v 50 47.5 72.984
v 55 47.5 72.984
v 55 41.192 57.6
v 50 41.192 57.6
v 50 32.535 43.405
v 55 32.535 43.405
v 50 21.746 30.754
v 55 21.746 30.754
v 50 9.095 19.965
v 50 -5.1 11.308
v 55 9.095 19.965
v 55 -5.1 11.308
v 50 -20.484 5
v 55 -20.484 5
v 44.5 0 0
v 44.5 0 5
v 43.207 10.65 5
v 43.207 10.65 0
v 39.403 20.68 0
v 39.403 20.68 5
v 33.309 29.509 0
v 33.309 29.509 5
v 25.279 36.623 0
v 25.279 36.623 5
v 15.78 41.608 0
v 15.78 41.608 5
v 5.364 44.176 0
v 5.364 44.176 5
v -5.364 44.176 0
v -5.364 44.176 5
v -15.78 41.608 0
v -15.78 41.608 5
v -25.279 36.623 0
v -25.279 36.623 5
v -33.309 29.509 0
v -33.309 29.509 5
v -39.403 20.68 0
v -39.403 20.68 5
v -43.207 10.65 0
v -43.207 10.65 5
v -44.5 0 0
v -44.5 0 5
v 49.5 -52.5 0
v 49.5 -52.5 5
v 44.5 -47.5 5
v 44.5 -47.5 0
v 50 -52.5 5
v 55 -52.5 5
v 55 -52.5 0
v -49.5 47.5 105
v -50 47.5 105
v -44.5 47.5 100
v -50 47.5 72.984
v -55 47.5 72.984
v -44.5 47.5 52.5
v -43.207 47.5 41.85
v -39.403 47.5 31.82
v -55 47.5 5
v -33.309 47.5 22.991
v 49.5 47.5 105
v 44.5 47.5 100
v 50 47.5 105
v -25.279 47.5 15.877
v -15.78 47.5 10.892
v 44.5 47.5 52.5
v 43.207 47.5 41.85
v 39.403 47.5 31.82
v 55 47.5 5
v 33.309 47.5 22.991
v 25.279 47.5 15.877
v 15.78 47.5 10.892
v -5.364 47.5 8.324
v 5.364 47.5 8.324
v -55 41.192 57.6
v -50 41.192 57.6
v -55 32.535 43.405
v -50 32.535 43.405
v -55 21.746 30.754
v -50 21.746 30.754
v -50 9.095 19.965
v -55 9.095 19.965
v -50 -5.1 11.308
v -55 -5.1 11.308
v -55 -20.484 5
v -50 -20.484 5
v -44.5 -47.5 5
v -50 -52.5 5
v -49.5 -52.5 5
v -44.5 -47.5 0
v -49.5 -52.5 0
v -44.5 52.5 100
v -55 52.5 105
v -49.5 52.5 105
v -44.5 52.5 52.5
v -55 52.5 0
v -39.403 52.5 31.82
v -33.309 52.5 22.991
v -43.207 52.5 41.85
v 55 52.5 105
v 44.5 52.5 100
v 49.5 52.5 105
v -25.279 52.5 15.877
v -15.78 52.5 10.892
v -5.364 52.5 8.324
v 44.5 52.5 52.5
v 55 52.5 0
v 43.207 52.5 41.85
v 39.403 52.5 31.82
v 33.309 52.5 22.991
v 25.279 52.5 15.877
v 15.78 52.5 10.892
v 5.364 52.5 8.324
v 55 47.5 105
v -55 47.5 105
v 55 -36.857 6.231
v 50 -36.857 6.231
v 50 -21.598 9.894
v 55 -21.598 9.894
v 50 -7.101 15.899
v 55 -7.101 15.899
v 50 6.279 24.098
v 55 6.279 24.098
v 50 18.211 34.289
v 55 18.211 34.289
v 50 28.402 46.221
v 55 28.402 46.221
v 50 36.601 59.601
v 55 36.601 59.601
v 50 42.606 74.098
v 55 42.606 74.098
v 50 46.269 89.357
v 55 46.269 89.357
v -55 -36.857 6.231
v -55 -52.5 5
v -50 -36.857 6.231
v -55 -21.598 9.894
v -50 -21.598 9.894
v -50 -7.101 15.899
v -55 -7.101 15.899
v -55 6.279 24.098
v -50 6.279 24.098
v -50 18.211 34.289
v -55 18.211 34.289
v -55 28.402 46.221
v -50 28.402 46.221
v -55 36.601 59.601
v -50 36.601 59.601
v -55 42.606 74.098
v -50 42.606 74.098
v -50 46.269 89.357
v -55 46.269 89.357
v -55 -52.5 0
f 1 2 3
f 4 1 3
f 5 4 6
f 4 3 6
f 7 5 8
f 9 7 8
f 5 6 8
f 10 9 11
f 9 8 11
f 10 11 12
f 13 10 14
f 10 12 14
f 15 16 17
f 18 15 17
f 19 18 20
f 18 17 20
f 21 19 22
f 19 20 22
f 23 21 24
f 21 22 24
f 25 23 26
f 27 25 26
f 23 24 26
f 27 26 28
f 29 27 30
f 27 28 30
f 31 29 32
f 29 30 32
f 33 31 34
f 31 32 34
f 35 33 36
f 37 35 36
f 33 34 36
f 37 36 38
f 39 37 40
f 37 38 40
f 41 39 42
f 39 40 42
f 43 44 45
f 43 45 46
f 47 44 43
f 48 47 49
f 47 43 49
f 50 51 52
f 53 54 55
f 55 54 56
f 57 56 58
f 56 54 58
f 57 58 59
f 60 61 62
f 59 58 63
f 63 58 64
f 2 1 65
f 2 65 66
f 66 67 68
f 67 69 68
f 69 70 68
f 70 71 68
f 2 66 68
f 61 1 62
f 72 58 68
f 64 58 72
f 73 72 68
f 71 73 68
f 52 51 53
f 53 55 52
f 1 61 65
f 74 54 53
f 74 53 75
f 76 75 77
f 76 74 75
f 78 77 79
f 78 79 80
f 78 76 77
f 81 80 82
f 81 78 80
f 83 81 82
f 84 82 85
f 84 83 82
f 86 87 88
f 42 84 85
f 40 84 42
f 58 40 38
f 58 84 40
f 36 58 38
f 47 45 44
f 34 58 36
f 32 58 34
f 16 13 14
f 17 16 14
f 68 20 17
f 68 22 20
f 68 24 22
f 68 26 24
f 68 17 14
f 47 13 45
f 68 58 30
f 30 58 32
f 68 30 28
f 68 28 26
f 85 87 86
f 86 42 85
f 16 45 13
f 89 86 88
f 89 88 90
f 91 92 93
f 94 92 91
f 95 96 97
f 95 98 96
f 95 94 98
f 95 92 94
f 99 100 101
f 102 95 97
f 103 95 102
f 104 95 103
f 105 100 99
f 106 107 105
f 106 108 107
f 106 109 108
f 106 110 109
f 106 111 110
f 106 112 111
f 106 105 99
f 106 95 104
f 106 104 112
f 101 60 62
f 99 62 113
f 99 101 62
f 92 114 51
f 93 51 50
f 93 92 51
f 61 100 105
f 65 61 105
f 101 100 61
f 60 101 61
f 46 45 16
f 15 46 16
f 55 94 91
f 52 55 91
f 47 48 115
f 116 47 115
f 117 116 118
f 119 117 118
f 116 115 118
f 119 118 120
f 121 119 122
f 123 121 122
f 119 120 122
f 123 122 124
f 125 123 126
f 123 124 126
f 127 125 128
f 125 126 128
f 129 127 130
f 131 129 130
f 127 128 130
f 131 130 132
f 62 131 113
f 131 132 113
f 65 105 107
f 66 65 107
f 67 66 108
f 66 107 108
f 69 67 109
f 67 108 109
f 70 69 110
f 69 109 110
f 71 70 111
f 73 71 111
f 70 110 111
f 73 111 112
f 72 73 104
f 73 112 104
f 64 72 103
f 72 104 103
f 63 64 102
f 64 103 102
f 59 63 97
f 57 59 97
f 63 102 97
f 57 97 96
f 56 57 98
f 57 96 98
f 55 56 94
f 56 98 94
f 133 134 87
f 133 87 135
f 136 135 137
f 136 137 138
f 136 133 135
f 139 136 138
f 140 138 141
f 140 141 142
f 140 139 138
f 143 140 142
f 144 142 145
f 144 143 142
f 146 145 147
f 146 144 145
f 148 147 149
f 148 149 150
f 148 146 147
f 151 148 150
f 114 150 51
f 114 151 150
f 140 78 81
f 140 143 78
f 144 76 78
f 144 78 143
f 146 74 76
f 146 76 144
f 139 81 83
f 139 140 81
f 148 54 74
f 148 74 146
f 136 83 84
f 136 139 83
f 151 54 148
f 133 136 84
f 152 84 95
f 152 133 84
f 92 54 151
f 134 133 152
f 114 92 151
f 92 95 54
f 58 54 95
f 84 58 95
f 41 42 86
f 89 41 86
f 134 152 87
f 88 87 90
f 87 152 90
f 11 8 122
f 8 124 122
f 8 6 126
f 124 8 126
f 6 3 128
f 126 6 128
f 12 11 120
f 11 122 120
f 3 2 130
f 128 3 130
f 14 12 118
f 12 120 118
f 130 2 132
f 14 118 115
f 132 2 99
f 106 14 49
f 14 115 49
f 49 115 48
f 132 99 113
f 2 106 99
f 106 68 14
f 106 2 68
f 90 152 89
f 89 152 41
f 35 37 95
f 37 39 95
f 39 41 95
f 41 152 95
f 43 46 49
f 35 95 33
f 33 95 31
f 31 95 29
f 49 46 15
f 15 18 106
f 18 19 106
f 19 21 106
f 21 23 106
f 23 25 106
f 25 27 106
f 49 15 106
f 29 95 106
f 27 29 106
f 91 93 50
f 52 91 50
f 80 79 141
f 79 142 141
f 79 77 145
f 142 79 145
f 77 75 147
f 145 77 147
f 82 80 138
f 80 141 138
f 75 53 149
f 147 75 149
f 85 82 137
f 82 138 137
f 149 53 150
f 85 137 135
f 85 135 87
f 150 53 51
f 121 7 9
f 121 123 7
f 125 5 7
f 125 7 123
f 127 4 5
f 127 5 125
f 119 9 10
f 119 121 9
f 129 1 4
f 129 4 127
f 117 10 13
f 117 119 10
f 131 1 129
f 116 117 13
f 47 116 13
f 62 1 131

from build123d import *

# Parameters (mm, degrees)
F0_W      = 110
F0_H      = 105
F1_DEPTH  = 5
F2_W      = 110
F2_H      = 5
F3_DEPTH  = 100
F5_DEPTH  = 5
F8_DEPTH  = 5.001
F10_DEPTH = 105.001
F11_SIZE  = 5


with BuildPart() as f1:
    # F0 (on Top) → F1 (new body)
    with BuildSketch(Plane.XY):
        Rectangle(F0_W, F0_H)
    extrude(amount=F1_DEPTH)

    # F2 (on face) → F3 (join)
    with BuildSketch(Plane.XY.offset(5)):
        with Locations((0, 50)):
            Rectangle(F2_W, F2_H)
    extrude(amount=F3_DEPTH)

    # F4 (on face) → F5 (join)
    with BuildSketch(Plane(origin=(-55, 0, 0), x_dir=(0, -1, 0), z_dir=(-1, 0, 0))):
        with BuildLine():
            ThreePointArc((52.5, 5), (-18.2106781187, 34.2893218813), (-47.5, 105))
            Line((-47.5, 105), (-47.5, 72.9843788128))
            ThreePointArc((-47.5, 72.9843788128), (-21.7462120246, 30.7537879754), (20.4843788128, 5))
            Line((20.4843788128, 5), (52.5, 5))
        make_face()
    extrude(amount=-F5_DEPTH)

    # F6: F1 across plane


with BuildPart() as f1_1:
    add(f1.part)
    add(f1.part.mirror(Plane.YZ))

    # F7 (on face) → F8 (cut, through all)
    with BuildSketch(Plane.XY.offset(5)):
        with BuildLine():
            Line((44.5, -52.5), (44.5, 0))
            ThreePointArc((44.5, 0), (0, 44.5), (-44.5, 0))
            Line((-44.5, 0), (-44.5, -52.5))
            Line((-44.5, -52.5), (44.5, -52.5))
        make_face()
    extrude(amount=-F8_DEPTH, mode=Mode.SUBTRACT)

    # F9 (on face) → F10 (cut, through all)
    with BuildSketch(Plane(origin=(0, 52.5, 0), x_dir=(-1, 0, 0), z_dir=(0, 1, 0))):
        with BuildLine():
            Line((-44.5, 105), (-44.5, 52.5))
            ThreePointArc((-44.5, 52.5), (0, 8), (44.5, 52.5))
            Line((44.5, 52.5), (44.5, 105))
            Line((44.5, 105), (-44.5, 105))
        make_face()
    extrude(amount=-F10_DEPTH, mode=Mode.SUBTRACT)

    # F11
    f11_edges = [f1_1.edges().sort_by_distance(p)[0] for p in [
        (44.5, 50, 105),
        (-44.5, 50, 105),
        (44.5, -52.5, 2.5),
        (-44.5, -52.5, 2.5),
    ]]
    chamfer(f11_edges, length=F11_SIZE)


solid = f1_1.part
